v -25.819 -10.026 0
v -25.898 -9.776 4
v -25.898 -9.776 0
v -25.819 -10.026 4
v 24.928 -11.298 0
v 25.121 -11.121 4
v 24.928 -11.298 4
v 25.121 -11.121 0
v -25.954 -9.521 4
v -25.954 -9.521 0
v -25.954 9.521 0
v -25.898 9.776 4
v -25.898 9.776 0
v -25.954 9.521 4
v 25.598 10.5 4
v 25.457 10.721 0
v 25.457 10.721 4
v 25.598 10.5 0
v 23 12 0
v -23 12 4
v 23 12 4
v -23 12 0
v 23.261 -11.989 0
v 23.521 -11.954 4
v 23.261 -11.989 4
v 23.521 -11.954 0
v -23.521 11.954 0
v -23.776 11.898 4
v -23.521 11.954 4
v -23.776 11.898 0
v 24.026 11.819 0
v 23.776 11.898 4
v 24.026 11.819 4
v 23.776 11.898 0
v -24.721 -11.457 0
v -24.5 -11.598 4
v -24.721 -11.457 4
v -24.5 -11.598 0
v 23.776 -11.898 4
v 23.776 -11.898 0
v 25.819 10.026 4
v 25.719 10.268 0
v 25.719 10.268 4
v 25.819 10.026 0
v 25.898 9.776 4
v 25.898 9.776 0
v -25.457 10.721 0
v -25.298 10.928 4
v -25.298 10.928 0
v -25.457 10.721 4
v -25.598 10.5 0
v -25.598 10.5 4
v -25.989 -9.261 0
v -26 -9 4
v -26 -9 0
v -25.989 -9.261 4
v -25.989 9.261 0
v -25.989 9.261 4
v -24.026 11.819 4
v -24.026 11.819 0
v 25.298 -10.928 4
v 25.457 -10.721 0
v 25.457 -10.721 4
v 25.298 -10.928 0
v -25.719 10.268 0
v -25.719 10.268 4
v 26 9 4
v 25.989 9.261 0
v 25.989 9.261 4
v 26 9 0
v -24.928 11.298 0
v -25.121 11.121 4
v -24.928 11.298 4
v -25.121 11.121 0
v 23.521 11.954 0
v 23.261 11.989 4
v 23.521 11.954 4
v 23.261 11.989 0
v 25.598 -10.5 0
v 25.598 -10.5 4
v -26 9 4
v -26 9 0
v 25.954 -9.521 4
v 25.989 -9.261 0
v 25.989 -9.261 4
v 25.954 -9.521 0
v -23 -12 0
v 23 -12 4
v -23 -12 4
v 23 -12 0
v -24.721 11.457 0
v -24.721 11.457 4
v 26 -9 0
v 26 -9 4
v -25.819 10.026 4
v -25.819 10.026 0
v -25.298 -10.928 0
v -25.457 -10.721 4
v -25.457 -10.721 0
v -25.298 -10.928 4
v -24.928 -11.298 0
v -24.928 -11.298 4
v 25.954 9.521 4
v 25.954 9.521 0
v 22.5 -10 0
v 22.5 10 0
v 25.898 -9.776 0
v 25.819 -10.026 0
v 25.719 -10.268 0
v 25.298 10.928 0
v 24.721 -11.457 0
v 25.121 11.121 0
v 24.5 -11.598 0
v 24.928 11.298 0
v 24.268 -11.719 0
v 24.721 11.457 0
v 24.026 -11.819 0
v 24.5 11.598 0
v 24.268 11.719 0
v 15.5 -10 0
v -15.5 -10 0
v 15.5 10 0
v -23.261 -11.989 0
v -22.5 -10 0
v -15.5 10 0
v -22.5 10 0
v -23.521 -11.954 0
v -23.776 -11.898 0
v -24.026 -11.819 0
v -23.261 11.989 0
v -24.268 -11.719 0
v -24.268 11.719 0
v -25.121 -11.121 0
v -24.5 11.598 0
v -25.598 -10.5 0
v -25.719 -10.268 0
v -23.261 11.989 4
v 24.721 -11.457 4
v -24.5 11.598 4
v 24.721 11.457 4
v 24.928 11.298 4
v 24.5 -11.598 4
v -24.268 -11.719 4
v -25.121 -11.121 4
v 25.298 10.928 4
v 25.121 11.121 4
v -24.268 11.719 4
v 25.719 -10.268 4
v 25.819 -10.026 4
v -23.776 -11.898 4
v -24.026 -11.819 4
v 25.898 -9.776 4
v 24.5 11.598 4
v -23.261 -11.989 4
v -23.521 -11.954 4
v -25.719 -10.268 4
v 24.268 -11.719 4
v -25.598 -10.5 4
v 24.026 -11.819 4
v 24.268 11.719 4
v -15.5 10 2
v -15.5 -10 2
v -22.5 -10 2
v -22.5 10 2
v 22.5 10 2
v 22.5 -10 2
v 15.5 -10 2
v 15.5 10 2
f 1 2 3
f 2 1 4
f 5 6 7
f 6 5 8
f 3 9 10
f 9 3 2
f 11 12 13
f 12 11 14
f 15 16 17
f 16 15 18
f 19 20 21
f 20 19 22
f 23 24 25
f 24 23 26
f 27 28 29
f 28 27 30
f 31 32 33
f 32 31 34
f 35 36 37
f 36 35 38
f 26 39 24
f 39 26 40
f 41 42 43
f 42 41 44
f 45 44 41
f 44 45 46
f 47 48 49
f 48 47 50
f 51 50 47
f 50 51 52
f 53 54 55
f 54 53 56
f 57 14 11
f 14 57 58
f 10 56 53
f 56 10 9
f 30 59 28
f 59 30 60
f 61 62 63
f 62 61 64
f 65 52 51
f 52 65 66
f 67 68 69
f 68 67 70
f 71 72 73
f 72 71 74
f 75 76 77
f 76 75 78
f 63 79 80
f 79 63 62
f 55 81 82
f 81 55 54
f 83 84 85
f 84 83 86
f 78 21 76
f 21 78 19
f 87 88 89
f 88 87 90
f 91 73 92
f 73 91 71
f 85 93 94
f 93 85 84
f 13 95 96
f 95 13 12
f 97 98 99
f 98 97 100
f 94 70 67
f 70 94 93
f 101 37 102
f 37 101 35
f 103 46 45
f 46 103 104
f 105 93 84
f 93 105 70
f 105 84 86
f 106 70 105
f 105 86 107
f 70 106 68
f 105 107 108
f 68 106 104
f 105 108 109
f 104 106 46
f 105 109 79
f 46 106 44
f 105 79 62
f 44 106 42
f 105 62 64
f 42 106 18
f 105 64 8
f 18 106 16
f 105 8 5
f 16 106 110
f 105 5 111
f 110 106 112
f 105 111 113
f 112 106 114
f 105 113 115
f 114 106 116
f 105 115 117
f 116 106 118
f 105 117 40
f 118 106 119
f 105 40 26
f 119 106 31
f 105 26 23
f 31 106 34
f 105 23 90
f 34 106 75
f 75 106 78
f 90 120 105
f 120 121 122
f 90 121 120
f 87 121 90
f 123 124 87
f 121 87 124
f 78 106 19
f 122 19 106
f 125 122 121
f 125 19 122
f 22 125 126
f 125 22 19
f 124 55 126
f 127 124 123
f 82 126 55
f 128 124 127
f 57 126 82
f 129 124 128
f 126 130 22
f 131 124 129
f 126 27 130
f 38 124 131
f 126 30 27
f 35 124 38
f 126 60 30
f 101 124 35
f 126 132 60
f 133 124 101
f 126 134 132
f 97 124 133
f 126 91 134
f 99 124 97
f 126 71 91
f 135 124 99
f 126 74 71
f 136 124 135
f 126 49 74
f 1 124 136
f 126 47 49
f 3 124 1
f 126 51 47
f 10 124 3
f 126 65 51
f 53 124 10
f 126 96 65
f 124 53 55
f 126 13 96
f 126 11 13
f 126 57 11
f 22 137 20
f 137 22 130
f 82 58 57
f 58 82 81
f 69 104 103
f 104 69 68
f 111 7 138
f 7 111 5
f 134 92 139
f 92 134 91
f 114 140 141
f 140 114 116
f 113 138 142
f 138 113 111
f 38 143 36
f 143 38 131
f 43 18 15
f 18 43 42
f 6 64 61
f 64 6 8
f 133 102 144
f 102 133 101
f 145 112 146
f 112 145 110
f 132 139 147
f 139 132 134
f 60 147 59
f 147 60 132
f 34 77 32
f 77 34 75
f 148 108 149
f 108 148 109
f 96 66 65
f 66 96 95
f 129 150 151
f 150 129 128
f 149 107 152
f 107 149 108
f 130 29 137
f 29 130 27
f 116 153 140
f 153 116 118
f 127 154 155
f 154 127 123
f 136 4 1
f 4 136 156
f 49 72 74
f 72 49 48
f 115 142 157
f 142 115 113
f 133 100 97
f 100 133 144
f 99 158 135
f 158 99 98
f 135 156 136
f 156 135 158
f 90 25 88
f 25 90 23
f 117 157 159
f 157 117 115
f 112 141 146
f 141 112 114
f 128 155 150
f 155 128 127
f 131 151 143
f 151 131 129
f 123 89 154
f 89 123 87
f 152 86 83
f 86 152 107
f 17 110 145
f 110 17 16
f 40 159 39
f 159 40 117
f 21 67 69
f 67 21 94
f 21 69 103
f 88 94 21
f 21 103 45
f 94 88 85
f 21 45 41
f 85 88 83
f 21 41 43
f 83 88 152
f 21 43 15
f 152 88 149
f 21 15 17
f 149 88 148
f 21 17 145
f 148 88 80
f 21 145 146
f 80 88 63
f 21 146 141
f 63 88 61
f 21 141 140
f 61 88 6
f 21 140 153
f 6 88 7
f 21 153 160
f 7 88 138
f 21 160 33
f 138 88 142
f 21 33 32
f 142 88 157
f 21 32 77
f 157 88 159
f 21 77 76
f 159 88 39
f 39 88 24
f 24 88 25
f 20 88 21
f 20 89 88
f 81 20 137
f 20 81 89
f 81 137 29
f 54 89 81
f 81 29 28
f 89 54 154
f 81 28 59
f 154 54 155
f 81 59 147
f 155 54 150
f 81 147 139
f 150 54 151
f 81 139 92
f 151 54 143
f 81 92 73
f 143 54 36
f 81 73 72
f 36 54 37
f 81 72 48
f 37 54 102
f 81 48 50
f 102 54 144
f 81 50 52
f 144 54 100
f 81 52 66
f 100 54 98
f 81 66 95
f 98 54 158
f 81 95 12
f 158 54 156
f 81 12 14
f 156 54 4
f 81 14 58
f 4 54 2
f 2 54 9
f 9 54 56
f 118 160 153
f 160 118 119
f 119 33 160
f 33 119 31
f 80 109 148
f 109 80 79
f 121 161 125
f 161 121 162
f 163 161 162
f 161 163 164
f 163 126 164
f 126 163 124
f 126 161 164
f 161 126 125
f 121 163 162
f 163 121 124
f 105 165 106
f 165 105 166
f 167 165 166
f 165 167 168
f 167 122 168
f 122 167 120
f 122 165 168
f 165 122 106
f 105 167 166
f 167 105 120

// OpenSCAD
// TS-PET-B02 - Harness Nameplate Slider
$fn = 72; plate_w = 52; plate_h = 24; plate_t = 4.0; corner_d = 6; strap_w = 20; slot_margin = 7;
module rounded_rect_2d(w,h,d) { hull() { translate([-w/2 + d/2, -h/2 + d/2]) circle(d = d); translate([ w/2 - d/2, -h/2 + d/2]) circle(d = d); translate([-w/2 + d/2,  h/2 - d/2]) circle(d = d); translate([ w/2 - d/2,  h/2 - d/2]) circle(d = d);} }
difference() { linear_extrude(height = plate_t) rounded_rect_2d(plate_w, plate_h, corner_d); translate([-plate_w/2 + slot_margin,0,-1]) cube([slot_margin, strap_w, plate_t + 2], center = true); translate([ plate_w/2 - slot_margin,0,-1]) cube([slot_margin, strap_w, plate_t + 2], center = true); }
